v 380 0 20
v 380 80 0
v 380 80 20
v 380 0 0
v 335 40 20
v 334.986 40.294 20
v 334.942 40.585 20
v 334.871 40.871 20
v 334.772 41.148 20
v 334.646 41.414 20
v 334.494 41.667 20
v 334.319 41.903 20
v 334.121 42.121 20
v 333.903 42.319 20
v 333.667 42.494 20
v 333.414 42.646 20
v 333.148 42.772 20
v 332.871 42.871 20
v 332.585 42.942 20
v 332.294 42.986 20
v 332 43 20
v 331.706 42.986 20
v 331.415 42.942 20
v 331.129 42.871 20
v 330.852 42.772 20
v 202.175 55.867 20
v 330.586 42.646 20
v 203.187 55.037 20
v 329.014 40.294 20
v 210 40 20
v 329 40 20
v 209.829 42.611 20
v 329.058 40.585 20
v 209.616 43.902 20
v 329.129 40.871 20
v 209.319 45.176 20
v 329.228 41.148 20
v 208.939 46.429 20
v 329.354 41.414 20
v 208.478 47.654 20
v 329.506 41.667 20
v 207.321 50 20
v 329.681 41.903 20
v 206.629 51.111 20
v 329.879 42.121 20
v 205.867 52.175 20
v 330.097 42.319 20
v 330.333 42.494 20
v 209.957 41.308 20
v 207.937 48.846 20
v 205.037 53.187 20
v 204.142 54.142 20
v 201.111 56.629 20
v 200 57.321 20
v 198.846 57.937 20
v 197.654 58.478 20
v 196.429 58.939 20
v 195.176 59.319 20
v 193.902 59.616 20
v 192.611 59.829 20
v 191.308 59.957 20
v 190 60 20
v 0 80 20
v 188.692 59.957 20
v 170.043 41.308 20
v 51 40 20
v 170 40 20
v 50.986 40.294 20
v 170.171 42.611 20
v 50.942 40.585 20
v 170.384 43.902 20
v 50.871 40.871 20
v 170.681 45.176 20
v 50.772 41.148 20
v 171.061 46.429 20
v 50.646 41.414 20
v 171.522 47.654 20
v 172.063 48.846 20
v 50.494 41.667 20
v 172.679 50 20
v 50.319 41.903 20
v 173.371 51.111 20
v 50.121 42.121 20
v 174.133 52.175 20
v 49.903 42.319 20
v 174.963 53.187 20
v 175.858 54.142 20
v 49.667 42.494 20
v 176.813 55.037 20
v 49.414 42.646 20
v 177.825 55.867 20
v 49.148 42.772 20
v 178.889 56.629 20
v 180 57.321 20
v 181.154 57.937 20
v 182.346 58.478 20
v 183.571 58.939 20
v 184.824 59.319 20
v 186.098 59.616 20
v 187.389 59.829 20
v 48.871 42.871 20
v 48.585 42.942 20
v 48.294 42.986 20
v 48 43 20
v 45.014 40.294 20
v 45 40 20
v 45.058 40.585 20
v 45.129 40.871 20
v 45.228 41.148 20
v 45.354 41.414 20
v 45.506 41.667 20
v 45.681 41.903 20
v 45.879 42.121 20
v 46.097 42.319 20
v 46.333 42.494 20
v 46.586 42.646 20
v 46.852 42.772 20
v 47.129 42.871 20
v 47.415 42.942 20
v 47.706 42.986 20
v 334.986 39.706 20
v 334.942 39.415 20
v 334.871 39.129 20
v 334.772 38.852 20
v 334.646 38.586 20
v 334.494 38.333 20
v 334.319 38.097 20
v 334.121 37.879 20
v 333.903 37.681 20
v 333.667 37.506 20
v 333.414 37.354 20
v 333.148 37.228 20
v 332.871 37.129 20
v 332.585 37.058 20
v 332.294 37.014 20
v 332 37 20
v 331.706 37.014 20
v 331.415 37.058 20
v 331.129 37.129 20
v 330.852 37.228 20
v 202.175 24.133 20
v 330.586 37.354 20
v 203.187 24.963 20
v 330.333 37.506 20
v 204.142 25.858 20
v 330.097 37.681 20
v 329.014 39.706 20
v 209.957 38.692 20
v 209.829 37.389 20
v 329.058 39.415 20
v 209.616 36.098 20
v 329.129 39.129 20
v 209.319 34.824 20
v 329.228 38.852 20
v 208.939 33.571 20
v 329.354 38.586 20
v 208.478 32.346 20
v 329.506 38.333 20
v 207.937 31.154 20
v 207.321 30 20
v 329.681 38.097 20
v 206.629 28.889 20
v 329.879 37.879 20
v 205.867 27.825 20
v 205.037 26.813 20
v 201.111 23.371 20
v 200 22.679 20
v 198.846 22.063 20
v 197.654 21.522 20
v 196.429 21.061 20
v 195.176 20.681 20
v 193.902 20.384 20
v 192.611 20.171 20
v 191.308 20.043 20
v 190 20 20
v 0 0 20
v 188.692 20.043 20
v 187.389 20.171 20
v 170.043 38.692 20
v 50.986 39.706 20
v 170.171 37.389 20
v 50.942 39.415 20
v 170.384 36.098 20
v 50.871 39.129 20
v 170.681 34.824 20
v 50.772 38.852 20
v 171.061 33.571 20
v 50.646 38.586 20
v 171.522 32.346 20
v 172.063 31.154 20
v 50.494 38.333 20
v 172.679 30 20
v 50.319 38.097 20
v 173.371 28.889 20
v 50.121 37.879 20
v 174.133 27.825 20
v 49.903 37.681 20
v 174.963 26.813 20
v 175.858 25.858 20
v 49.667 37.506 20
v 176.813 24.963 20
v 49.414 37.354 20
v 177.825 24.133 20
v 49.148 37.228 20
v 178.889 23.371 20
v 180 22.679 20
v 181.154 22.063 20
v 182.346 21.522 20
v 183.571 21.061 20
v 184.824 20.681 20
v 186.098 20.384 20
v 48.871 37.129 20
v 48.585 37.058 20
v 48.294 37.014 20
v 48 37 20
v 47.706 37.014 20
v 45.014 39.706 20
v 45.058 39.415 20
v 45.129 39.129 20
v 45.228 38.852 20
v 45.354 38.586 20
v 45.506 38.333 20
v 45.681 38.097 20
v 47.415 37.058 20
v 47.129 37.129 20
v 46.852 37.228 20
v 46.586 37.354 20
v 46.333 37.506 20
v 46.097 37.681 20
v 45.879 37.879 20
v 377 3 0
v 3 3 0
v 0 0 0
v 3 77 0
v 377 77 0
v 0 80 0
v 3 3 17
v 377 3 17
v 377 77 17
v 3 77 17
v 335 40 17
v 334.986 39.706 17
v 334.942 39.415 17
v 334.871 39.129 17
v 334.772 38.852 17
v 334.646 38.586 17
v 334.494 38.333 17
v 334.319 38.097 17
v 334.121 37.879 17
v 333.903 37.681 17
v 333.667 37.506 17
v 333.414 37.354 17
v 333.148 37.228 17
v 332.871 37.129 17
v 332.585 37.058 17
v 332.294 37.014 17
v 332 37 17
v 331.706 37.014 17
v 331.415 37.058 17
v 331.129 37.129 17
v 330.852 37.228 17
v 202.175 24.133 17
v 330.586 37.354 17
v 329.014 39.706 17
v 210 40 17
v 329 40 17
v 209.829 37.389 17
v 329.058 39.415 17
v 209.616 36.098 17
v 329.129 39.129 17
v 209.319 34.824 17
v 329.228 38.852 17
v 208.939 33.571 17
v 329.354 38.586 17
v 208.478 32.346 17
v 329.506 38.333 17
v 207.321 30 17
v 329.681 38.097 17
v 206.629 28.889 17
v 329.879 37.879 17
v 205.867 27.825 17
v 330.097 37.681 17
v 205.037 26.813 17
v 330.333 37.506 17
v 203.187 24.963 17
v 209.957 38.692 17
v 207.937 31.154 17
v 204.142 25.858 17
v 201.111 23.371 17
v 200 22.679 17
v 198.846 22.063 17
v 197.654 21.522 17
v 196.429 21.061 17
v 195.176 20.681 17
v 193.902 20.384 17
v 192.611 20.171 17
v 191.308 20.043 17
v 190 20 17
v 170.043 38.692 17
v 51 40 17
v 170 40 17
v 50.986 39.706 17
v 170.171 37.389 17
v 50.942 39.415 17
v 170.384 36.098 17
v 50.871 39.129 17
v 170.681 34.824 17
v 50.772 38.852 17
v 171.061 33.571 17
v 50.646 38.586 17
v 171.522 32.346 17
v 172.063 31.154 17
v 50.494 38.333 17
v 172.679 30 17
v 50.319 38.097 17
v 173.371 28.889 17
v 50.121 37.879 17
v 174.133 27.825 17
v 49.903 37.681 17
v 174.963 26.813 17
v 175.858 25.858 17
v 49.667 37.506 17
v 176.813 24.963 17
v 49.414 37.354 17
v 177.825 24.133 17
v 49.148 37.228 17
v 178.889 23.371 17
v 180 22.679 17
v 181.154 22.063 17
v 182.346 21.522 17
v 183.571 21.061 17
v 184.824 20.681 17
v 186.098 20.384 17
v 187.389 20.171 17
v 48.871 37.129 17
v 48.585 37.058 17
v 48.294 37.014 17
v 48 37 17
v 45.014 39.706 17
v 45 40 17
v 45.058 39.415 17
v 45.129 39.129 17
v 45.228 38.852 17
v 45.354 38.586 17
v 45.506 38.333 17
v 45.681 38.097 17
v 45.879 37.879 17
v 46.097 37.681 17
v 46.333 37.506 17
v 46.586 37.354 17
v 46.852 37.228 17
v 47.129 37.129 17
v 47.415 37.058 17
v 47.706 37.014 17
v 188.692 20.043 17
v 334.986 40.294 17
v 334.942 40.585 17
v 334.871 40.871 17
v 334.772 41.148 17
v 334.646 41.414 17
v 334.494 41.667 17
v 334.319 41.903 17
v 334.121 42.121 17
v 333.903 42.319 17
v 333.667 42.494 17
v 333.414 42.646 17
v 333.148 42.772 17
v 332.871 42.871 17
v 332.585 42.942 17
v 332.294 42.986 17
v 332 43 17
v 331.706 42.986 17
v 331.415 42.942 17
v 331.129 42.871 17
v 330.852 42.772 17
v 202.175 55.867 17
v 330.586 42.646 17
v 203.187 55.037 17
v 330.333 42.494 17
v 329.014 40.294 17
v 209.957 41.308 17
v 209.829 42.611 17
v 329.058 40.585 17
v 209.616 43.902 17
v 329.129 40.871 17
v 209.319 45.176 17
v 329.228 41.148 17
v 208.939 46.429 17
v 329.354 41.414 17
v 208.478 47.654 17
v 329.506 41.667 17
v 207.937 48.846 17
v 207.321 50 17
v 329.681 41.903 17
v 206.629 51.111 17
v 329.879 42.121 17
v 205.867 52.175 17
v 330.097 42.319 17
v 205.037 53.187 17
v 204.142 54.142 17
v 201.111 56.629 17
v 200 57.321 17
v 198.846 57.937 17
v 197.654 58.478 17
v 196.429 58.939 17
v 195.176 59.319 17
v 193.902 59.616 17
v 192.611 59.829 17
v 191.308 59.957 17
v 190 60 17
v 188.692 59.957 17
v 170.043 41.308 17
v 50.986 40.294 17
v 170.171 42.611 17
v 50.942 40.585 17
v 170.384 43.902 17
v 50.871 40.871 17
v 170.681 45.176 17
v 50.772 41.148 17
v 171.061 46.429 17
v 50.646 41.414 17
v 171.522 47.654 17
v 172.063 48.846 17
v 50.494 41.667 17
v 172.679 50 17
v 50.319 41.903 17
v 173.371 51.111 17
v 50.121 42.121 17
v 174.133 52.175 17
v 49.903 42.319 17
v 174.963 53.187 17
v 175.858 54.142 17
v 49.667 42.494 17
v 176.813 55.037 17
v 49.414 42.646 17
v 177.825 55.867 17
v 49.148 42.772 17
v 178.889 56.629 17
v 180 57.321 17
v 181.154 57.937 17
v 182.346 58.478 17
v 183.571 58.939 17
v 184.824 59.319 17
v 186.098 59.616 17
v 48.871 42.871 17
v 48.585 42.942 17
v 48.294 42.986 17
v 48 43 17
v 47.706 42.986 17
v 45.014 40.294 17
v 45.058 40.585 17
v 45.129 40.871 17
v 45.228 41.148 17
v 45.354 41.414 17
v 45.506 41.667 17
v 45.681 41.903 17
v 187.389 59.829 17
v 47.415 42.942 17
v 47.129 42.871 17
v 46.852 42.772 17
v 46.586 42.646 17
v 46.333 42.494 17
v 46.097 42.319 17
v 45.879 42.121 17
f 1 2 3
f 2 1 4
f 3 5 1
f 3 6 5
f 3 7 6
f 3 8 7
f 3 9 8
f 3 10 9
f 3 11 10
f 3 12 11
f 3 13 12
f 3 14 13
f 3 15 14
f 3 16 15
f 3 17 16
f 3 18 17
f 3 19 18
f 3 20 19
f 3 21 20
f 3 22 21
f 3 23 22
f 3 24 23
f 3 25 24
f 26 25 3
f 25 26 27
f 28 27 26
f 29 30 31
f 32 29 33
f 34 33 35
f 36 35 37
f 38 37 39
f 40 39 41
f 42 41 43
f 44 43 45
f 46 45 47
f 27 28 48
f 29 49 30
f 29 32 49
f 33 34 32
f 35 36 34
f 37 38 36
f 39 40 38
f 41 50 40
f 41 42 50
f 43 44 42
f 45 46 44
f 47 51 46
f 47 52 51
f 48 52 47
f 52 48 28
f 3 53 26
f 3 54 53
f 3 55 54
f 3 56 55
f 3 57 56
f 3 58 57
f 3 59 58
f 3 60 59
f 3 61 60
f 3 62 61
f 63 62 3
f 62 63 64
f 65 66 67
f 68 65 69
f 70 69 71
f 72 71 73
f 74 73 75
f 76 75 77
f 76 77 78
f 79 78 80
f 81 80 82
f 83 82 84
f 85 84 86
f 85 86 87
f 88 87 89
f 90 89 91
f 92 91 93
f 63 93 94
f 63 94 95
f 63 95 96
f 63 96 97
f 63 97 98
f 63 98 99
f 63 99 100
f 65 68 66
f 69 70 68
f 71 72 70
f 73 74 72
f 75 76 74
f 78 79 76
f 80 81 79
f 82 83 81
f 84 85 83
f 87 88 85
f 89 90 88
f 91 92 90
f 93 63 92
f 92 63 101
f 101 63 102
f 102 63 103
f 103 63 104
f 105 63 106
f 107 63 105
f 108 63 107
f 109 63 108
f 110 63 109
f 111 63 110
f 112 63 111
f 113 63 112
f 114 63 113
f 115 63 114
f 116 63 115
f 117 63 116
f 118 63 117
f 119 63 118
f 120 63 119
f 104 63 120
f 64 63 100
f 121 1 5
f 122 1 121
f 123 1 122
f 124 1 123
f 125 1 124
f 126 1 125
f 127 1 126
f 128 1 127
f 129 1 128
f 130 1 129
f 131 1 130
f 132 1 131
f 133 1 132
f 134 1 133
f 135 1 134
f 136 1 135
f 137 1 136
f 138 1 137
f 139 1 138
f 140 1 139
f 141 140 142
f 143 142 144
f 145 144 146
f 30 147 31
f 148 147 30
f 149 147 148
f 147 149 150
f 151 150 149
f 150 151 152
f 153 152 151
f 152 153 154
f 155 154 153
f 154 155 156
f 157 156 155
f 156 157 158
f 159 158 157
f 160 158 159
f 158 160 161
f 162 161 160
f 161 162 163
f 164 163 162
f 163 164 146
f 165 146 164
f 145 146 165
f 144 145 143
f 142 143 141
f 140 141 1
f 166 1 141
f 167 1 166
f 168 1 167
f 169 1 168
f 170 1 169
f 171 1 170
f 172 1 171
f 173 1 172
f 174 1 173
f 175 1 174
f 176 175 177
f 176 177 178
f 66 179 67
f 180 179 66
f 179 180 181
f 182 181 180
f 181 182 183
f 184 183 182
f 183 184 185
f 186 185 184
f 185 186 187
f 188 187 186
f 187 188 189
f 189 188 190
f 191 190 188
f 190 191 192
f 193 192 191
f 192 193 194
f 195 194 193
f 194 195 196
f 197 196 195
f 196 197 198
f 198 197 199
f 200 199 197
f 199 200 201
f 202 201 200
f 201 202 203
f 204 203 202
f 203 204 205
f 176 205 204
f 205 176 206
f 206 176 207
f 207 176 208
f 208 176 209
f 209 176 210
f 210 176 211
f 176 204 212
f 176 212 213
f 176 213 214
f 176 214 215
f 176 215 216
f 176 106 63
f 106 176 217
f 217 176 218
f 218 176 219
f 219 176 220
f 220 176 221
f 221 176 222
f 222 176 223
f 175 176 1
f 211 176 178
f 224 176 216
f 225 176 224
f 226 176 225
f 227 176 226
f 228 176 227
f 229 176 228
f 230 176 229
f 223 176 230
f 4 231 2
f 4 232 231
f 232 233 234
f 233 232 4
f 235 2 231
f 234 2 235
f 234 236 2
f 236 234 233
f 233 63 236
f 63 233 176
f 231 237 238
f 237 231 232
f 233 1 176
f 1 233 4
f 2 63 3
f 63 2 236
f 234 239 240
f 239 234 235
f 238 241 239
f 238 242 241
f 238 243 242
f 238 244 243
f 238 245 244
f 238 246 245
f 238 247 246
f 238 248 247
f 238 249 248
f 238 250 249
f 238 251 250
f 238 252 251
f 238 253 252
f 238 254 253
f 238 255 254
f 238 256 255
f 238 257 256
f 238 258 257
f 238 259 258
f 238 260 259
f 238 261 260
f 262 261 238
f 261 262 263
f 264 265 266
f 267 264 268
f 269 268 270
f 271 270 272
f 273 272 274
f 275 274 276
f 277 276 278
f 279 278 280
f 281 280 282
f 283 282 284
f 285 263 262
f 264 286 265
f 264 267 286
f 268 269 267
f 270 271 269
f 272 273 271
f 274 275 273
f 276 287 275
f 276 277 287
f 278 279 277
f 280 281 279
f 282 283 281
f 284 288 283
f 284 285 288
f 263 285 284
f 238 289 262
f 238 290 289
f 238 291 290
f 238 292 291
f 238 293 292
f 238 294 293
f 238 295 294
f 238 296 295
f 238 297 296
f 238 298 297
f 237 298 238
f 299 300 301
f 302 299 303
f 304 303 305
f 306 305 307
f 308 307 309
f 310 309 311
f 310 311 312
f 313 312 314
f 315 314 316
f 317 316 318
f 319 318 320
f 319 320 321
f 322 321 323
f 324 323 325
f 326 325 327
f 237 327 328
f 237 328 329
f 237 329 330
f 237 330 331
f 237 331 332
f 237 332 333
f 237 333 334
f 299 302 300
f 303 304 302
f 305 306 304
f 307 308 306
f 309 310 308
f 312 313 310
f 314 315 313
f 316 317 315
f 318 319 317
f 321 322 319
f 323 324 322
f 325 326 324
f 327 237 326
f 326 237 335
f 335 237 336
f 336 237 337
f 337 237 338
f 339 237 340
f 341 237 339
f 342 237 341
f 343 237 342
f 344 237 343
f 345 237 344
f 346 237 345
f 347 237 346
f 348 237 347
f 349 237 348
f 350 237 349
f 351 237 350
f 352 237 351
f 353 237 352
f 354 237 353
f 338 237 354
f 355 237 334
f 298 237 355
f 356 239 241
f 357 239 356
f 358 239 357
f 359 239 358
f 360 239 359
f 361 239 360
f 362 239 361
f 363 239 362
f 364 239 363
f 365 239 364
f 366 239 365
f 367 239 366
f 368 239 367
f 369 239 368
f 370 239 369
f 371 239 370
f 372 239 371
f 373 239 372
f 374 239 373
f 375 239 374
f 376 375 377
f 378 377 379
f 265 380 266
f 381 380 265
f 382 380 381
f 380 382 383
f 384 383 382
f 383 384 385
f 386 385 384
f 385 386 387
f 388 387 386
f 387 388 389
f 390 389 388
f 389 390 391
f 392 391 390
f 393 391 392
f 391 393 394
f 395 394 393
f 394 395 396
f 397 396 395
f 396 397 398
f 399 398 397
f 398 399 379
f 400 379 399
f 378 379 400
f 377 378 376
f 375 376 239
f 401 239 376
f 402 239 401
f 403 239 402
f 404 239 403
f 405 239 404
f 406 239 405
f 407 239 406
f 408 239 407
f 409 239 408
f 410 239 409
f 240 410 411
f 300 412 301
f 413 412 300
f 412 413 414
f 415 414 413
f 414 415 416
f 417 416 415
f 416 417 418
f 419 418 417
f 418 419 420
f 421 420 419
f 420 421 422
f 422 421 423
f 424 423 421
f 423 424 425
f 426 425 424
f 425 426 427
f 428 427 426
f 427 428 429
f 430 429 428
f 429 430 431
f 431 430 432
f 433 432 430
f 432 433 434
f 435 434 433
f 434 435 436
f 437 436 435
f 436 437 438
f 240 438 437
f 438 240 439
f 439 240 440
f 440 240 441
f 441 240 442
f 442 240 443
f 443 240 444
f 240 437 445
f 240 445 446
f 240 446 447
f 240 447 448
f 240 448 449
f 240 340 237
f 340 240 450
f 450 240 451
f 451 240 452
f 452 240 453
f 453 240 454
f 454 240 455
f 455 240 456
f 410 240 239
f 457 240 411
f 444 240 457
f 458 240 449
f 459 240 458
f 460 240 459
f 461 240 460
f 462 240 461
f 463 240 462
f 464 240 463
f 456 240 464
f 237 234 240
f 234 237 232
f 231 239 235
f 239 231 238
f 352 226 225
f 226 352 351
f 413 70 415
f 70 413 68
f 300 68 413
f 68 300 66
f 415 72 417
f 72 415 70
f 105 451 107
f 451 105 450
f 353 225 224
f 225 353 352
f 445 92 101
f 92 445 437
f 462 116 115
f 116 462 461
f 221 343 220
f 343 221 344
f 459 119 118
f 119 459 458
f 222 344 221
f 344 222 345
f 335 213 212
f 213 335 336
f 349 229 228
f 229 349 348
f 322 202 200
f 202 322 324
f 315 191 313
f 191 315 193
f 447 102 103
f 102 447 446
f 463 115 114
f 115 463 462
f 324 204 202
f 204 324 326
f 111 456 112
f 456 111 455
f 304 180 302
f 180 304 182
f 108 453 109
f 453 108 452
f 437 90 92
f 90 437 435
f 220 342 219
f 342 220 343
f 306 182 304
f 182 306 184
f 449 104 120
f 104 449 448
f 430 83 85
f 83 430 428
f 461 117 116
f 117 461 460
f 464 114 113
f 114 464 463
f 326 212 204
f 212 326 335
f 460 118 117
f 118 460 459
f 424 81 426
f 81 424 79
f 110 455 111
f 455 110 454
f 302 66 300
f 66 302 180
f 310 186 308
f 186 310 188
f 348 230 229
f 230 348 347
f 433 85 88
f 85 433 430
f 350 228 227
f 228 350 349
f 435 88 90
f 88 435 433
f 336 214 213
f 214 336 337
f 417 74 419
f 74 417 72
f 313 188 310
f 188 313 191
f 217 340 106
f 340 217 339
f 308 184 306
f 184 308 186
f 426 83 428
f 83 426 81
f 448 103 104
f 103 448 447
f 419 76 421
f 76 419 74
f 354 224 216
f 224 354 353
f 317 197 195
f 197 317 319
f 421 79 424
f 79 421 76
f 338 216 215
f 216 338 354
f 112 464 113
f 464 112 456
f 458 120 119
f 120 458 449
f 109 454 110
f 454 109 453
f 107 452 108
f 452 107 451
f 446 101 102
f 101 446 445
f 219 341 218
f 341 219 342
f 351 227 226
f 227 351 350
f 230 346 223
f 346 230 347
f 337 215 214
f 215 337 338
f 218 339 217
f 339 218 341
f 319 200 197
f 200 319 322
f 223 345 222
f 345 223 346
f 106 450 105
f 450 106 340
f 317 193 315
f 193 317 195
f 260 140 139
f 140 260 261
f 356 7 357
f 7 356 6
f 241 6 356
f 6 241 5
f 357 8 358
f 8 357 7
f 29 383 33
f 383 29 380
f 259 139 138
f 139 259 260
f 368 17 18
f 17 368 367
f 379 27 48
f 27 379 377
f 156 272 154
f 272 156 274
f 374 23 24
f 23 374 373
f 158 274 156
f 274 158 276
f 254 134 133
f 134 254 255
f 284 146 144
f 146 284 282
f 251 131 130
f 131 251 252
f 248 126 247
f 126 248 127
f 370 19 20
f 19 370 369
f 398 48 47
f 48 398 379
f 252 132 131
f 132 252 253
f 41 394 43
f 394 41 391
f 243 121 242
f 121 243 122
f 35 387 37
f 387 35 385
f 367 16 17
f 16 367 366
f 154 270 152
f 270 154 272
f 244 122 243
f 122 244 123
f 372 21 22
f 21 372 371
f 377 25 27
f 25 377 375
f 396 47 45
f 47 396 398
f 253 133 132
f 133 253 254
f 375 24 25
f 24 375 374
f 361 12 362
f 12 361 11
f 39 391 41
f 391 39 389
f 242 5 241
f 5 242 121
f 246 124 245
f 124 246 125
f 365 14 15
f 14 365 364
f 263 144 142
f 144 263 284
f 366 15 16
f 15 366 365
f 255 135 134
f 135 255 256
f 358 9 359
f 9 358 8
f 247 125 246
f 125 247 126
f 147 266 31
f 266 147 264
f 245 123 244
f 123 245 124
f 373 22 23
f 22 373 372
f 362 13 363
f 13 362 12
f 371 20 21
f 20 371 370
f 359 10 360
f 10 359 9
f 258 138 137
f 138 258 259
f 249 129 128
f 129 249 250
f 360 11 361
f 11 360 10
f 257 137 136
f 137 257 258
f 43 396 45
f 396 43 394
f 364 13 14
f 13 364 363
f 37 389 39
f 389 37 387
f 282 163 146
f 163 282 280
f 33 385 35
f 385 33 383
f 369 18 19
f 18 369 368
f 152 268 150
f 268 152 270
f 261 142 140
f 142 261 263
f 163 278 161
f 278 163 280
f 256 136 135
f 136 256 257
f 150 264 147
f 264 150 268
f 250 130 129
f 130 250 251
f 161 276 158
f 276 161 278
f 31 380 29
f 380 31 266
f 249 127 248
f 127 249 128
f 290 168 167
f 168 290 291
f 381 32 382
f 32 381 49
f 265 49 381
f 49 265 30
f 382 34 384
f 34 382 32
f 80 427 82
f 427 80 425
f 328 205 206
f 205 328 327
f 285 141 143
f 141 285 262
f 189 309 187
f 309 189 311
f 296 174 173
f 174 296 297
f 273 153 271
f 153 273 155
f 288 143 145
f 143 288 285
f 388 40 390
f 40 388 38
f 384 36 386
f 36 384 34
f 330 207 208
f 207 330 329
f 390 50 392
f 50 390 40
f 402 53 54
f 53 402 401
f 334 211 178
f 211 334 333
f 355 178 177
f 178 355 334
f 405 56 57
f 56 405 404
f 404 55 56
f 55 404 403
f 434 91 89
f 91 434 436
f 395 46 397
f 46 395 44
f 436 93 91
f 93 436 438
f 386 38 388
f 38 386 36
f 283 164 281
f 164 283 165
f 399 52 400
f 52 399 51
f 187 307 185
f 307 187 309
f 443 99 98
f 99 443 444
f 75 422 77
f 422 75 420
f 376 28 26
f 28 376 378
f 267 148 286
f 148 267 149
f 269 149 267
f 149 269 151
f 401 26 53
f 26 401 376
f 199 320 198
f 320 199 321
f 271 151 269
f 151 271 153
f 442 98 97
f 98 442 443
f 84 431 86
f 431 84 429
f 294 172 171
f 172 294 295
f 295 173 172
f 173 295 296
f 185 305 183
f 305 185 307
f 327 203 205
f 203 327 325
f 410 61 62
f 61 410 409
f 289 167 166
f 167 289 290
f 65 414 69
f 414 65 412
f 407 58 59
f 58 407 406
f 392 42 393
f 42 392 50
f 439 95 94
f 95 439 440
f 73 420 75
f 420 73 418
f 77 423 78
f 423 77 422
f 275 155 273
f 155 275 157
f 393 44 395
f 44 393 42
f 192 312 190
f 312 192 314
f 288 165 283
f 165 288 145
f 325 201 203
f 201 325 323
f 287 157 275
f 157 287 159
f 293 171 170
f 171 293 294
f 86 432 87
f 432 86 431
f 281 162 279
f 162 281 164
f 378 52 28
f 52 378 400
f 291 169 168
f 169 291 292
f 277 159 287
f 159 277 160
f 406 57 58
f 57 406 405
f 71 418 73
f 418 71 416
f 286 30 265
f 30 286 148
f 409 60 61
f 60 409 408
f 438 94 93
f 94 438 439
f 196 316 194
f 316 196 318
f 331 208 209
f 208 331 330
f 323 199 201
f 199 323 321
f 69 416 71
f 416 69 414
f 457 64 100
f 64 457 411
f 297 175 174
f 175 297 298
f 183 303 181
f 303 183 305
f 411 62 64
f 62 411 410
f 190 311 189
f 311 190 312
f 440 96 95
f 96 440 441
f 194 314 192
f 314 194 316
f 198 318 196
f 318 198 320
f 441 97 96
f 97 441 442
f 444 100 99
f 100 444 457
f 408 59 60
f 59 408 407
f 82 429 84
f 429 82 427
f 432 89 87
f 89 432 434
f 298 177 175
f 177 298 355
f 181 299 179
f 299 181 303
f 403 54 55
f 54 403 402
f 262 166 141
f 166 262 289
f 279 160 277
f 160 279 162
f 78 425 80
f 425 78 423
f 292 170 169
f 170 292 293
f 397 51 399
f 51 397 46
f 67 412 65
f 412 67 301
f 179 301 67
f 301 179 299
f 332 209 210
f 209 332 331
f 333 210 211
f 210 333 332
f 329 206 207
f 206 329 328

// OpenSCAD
length_x = 380;
width_y = 80;
height_z = 20;
thickness = 3;
hole_diameter = 6;
hole_spacing = 284;
hole_y = width_y / 2;
hole_x1 = (length_x - hole_spacing) / 2;
hole_x2 = hole_x1 + hole_spacing;
center_hole_diameter = 40;
center_hole_x = length_x / 2;

difference() {
    union() {
        // Due montanti lungo Z.
        cube([length_x, thickness, height_z]);
        translate([0, width_y - thickness, 0])
            cube([length_x, thickness, height_z]);

        // Tratto lungo Y, in alto.
        translate([0, 0, height_z - thickness])
            cube([length_x, width_y, thickness]);

        // Chiusure alle due estremita lungo X.
        cube([thickness, width_y, height_z]);
        translate([length_x - thickness, 0, 0])
            cube([thickness, width_y, height_z]);
    }

    for (x = [hole_x1, hole_x2]) {
        translate([x, hole_y, height_z - thickness - 1])
            cylinder(h = thickness + 2, d = hole_diameter, $fn = 64);
    }

    translate([center_hole_x, hole_y, height_z - thickness - 1])
        cylinder(h = thickness + 2, d = center_hole_diameter, $fn = 96);
}
